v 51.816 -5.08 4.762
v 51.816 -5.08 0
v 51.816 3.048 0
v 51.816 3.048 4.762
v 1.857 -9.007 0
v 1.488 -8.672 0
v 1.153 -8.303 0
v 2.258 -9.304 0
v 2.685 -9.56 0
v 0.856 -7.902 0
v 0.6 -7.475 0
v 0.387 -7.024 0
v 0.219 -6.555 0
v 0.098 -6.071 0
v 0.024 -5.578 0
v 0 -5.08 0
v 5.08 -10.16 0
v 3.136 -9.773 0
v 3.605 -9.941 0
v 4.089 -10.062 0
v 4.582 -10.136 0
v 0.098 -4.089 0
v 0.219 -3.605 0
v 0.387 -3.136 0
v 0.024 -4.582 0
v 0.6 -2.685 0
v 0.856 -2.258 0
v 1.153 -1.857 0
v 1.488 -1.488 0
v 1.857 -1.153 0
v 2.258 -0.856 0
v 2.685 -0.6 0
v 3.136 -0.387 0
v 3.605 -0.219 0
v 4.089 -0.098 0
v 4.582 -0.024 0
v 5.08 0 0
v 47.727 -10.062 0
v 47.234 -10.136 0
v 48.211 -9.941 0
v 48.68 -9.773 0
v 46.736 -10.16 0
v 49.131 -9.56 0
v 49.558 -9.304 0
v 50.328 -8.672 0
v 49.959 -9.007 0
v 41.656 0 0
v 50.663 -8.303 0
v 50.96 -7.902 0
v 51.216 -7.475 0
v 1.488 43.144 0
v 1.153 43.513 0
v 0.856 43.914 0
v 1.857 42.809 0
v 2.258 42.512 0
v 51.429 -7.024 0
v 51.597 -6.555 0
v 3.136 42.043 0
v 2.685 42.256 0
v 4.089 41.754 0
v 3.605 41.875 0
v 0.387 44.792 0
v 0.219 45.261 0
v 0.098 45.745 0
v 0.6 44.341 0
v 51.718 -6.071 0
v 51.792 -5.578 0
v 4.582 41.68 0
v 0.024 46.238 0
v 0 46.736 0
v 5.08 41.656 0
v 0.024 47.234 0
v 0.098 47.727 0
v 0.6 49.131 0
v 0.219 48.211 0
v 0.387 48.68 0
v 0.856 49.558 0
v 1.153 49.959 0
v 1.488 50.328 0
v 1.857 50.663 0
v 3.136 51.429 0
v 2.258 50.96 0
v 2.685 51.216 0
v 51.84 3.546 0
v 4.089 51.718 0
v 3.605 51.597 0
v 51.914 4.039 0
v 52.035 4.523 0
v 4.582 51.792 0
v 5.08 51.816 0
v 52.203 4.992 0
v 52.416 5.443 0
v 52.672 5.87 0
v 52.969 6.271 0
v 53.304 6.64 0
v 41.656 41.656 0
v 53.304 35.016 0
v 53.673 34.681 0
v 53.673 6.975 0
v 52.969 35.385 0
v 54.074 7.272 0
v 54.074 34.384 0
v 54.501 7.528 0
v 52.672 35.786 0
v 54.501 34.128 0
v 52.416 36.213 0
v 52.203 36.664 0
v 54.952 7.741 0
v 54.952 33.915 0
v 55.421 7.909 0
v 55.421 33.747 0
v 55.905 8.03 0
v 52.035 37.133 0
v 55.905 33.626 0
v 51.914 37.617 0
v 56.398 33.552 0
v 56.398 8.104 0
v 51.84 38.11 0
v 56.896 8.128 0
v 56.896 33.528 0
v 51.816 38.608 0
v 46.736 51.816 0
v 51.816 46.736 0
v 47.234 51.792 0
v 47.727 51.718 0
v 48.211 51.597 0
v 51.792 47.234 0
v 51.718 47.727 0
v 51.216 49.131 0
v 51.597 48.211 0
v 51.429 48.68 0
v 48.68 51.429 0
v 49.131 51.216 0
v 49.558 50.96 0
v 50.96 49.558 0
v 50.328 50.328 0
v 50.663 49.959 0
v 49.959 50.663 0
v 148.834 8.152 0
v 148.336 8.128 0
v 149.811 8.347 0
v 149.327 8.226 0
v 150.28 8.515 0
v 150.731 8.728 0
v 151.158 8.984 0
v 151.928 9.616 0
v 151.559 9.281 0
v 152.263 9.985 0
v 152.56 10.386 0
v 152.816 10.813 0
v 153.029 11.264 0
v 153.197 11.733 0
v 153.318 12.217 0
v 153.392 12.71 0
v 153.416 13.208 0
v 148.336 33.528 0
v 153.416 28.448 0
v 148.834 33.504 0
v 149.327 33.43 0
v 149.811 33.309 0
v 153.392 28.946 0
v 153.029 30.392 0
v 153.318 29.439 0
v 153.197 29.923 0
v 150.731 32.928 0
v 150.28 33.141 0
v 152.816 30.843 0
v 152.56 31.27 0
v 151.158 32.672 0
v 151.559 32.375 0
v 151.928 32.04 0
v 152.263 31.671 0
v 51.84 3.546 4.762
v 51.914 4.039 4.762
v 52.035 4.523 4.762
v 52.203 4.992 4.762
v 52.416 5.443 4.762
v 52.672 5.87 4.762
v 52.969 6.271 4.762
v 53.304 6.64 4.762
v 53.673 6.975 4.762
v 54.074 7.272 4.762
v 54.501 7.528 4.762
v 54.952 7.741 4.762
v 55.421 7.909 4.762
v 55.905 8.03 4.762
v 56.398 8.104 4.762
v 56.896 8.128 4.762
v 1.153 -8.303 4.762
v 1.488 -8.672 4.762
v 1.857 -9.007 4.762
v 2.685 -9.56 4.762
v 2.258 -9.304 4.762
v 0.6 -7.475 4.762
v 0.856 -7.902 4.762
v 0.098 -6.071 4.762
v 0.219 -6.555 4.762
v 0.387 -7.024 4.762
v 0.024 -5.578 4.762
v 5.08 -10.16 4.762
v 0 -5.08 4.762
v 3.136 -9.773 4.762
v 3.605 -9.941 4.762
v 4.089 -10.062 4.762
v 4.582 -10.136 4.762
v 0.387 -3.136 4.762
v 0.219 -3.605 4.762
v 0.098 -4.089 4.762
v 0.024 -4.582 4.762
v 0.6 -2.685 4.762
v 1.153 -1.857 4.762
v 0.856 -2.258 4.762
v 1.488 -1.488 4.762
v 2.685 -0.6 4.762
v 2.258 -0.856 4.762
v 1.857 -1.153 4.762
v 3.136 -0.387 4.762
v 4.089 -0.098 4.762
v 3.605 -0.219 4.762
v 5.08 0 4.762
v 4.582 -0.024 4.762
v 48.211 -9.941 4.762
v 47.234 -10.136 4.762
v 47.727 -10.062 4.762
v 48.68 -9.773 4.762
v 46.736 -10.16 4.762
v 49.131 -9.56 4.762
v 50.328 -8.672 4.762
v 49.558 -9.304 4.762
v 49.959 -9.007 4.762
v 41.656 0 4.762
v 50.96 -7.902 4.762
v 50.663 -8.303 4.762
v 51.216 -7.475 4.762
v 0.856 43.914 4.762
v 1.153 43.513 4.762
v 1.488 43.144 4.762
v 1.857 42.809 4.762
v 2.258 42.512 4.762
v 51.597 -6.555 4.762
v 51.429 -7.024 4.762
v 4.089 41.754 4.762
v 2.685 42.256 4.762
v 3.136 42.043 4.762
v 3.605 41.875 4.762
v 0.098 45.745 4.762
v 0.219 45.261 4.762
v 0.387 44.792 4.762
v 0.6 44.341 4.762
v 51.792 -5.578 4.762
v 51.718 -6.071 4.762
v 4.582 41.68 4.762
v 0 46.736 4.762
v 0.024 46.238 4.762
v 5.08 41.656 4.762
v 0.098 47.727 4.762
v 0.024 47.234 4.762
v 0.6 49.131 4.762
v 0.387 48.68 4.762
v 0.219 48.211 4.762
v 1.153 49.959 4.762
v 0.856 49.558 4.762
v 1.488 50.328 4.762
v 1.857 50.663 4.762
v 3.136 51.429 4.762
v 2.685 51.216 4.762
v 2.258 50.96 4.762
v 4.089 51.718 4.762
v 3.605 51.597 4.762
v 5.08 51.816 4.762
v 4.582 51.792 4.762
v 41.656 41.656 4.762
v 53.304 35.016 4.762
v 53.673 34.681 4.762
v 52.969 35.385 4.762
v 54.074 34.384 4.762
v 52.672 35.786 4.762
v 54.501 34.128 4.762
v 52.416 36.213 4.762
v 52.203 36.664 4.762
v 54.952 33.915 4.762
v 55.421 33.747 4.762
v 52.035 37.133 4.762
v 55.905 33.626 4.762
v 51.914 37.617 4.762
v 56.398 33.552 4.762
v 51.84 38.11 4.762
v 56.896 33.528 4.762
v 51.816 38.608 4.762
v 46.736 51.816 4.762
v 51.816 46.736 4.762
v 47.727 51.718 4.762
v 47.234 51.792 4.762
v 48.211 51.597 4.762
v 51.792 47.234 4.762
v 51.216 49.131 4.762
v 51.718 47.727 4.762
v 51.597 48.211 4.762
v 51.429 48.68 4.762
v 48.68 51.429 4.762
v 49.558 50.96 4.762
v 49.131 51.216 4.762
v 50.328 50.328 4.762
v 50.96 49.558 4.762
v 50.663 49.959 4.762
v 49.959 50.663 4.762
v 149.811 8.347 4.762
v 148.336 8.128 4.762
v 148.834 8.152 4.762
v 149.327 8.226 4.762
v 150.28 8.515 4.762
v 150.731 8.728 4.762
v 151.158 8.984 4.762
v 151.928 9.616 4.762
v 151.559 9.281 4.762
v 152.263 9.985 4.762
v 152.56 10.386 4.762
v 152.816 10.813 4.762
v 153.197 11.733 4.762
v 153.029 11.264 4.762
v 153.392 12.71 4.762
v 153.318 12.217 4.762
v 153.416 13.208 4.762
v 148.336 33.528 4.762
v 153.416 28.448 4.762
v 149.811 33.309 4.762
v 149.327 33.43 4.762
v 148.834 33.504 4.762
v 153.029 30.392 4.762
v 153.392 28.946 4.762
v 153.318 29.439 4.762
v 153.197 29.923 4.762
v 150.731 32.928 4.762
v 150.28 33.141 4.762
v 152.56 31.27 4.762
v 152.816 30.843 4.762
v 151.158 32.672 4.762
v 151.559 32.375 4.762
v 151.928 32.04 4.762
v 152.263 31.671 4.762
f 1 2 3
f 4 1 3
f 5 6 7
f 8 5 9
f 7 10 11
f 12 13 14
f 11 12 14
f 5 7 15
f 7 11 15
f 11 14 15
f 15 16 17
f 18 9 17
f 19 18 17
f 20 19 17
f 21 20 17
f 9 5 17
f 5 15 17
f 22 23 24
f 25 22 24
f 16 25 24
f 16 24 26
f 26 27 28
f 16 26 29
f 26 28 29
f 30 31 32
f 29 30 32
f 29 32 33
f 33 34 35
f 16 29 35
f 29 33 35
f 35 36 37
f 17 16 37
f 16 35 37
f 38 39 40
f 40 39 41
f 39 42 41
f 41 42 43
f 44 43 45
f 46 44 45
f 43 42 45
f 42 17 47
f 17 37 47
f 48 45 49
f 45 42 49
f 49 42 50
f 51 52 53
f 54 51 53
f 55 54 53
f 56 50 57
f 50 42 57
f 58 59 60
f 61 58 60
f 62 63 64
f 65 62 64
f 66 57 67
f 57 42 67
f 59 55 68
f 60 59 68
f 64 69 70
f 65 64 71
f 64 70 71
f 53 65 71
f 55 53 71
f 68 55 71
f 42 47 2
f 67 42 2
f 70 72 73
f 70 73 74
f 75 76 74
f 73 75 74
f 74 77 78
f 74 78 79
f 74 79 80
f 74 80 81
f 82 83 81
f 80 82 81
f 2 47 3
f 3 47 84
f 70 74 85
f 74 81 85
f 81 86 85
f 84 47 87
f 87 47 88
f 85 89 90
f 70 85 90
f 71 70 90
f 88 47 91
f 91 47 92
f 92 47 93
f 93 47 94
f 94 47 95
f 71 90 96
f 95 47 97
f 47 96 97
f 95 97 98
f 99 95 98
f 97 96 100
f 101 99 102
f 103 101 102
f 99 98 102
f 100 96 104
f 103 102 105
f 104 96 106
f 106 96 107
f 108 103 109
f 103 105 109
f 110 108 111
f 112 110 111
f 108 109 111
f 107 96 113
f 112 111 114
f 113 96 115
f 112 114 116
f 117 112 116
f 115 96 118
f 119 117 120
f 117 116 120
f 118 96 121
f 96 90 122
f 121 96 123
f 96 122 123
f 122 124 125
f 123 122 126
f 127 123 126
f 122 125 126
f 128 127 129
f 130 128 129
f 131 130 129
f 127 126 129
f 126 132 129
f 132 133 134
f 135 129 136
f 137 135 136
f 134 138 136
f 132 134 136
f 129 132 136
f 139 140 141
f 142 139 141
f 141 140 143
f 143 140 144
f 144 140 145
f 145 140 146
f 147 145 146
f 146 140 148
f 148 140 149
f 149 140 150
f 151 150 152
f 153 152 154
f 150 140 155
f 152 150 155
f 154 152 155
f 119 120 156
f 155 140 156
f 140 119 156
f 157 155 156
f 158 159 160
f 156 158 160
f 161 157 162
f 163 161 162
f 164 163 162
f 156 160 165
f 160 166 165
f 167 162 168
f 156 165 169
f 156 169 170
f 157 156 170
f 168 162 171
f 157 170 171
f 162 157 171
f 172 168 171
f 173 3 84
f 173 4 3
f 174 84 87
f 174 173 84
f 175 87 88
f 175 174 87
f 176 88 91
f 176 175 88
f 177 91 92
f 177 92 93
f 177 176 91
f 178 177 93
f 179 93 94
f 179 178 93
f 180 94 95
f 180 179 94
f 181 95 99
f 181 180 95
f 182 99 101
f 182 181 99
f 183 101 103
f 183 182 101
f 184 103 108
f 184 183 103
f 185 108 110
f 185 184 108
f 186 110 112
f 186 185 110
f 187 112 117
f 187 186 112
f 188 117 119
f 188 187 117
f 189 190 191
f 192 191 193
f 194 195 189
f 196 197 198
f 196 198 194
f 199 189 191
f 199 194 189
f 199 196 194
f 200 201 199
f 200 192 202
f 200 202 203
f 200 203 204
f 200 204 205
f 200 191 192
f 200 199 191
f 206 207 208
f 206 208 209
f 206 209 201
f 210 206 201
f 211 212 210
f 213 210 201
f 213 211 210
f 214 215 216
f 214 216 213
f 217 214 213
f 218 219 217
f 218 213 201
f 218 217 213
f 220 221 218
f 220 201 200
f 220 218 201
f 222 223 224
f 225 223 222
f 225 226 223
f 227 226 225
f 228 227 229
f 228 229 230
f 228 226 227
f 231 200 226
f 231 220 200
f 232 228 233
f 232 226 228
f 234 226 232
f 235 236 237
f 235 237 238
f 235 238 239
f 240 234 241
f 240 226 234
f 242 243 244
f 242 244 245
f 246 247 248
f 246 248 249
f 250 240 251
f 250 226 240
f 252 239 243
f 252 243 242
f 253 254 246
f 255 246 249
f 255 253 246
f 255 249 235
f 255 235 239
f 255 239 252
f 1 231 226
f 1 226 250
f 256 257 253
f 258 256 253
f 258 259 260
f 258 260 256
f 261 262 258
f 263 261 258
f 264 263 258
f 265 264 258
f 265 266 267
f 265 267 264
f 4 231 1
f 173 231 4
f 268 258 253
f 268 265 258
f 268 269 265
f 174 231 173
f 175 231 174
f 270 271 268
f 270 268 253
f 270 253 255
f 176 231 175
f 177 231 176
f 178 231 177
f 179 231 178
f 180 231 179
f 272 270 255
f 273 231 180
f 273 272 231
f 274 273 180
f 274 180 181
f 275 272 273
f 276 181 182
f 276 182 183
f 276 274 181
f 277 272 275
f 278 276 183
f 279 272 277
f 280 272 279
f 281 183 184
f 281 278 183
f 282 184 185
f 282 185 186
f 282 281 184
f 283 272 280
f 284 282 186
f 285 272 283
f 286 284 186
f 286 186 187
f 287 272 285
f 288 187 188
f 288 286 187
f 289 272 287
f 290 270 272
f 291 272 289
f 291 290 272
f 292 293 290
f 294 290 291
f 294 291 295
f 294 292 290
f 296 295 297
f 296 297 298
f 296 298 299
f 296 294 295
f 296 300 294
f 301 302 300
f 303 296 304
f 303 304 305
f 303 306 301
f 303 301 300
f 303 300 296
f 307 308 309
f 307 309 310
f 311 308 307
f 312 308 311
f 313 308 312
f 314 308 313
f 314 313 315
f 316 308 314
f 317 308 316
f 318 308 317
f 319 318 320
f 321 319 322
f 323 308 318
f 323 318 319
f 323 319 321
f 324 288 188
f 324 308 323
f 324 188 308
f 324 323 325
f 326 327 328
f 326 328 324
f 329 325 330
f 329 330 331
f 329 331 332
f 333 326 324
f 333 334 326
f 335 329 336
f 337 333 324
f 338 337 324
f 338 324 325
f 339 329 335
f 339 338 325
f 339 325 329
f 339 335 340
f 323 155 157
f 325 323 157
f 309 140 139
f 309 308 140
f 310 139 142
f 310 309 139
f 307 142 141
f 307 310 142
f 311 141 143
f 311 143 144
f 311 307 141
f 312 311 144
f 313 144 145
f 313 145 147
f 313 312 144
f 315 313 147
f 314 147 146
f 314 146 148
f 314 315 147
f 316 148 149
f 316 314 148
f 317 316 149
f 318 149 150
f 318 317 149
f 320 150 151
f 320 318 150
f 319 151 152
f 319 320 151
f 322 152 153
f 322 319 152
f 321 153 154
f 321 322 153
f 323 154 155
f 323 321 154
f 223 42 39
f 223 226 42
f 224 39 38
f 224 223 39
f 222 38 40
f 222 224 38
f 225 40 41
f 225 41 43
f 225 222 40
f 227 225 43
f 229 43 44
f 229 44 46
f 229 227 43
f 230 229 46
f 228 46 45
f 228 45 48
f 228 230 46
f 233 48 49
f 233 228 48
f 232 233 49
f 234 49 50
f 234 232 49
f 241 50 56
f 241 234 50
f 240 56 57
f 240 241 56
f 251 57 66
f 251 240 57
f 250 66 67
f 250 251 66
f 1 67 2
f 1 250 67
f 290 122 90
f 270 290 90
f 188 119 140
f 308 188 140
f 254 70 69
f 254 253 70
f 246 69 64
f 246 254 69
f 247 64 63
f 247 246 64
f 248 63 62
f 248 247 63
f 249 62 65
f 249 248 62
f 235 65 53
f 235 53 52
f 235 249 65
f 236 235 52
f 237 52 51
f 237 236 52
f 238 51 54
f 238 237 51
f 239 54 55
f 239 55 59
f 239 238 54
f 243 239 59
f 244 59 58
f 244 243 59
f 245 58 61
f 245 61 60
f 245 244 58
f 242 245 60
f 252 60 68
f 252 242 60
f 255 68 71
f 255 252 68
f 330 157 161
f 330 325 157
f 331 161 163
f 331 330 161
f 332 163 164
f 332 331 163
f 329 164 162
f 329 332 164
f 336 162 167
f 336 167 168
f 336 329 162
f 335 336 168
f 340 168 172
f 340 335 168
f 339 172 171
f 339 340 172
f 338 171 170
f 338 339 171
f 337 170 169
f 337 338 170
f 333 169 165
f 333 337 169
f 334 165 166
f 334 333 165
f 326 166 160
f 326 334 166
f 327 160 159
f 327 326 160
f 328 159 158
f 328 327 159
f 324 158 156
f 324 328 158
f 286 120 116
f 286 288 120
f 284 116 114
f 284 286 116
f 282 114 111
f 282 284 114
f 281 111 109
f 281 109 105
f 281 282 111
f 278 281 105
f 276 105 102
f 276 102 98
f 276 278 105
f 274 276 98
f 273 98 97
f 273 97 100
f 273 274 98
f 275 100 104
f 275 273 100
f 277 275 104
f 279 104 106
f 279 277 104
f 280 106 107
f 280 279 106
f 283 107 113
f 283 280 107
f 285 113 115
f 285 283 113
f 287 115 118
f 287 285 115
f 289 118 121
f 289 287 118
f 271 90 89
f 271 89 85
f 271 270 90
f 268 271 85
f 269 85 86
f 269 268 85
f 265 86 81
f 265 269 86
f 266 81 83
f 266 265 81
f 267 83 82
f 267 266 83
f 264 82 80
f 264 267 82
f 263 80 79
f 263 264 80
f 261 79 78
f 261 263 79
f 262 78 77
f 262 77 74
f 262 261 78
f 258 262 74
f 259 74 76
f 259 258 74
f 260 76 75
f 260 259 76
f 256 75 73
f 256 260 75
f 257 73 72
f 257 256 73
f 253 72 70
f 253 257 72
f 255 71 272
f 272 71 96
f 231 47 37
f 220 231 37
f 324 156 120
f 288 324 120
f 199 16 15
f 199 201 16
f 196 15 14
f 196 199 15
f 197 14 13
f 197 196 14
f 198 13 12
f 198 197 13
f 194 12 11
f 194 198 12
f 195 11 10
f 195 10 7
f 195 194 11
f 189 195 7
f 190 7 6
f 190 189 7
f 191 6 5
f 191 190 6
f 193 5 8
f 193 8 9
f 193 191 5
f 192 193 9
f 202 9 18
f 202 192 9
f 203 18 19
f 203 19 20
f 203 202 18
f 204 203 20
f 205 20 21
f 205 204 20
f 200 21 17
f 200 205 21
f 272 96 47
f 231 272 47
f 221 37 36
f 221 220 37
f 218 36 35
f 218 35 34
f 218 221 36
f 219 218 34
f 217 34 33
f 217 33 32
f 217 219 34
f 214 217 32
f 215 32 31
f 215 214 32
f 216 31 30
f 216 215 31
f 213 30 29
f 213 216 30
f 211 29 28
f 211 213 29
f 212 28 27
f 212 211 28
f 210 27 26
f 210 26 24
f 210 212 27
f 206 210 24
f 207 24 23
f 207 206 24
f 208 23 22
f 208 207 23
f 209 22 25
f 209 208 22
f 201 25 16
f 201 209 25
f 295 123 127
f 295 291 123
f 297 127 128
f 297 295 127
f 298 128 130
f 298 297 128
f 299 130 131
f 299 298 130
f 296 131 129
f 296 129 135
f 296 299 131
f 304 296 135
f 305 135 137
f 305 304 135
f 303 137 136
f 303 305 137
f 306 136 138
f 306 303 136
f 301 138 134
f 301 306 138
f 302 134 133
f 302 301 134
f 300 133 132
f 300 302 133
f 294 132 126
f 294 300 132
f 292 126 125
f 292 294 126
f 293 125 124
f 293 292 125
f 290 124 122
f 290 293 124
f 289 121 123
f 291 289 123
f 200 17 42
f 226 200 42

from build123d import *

# Parameters (mm, degrees)
F1_DEPTH = 4.7625
F2_R     = 5.07999


# Not quite as in the source:
# - a fillet or chamfer is up to 0.001 mm smaller than in the source, because OpenCascade refuses the exact size
# - a length typed as a fraction of an inch, garbled in the dataset ("3 / 203.2 mm" for 3/8 in), is restored


with BuildPart() as f1:
    # F0 (on Top) → F1 (new body)
    with BuildSketch(Plane.XY):
        Polygon((41.656, 0), (0, 0), (0, -10.16), (51.816, -10.16), (51.816, 8.128), (153.416, 8.128), (153.416, 33.528), (51.816, 33.528), (51.816, 51.816), (0, 51.816), (0, 41.656), (41.656, 41.656), align=None)
    extrude(amount=F1_DEPTH)

    # F2 (radius 5.08 in the source; OpenCascade refuses exactly that, so slightly less here)
    f2_edges = [f1.edges().sort_by_distance(p)[0] for p in [
        (0, 41.656, 2.38125),
        (0, 51.816, 2.38125),
        (0, 0, 2.38125),
        (0, -10.16, 2.38125),
        (51.816, -10.16, 2.38125),
        (51.816, 8.128, 2.38125),
        (51.816, 33.528, 2.38125),
        (51.816, 51.816, 2.38125),
        (153.416, 33.528, 2.38125),
        (153.416, 8.128, 2.38125),
    ]]
    fillet(f2_edges, radius=F2_R)


solid = f1.part
